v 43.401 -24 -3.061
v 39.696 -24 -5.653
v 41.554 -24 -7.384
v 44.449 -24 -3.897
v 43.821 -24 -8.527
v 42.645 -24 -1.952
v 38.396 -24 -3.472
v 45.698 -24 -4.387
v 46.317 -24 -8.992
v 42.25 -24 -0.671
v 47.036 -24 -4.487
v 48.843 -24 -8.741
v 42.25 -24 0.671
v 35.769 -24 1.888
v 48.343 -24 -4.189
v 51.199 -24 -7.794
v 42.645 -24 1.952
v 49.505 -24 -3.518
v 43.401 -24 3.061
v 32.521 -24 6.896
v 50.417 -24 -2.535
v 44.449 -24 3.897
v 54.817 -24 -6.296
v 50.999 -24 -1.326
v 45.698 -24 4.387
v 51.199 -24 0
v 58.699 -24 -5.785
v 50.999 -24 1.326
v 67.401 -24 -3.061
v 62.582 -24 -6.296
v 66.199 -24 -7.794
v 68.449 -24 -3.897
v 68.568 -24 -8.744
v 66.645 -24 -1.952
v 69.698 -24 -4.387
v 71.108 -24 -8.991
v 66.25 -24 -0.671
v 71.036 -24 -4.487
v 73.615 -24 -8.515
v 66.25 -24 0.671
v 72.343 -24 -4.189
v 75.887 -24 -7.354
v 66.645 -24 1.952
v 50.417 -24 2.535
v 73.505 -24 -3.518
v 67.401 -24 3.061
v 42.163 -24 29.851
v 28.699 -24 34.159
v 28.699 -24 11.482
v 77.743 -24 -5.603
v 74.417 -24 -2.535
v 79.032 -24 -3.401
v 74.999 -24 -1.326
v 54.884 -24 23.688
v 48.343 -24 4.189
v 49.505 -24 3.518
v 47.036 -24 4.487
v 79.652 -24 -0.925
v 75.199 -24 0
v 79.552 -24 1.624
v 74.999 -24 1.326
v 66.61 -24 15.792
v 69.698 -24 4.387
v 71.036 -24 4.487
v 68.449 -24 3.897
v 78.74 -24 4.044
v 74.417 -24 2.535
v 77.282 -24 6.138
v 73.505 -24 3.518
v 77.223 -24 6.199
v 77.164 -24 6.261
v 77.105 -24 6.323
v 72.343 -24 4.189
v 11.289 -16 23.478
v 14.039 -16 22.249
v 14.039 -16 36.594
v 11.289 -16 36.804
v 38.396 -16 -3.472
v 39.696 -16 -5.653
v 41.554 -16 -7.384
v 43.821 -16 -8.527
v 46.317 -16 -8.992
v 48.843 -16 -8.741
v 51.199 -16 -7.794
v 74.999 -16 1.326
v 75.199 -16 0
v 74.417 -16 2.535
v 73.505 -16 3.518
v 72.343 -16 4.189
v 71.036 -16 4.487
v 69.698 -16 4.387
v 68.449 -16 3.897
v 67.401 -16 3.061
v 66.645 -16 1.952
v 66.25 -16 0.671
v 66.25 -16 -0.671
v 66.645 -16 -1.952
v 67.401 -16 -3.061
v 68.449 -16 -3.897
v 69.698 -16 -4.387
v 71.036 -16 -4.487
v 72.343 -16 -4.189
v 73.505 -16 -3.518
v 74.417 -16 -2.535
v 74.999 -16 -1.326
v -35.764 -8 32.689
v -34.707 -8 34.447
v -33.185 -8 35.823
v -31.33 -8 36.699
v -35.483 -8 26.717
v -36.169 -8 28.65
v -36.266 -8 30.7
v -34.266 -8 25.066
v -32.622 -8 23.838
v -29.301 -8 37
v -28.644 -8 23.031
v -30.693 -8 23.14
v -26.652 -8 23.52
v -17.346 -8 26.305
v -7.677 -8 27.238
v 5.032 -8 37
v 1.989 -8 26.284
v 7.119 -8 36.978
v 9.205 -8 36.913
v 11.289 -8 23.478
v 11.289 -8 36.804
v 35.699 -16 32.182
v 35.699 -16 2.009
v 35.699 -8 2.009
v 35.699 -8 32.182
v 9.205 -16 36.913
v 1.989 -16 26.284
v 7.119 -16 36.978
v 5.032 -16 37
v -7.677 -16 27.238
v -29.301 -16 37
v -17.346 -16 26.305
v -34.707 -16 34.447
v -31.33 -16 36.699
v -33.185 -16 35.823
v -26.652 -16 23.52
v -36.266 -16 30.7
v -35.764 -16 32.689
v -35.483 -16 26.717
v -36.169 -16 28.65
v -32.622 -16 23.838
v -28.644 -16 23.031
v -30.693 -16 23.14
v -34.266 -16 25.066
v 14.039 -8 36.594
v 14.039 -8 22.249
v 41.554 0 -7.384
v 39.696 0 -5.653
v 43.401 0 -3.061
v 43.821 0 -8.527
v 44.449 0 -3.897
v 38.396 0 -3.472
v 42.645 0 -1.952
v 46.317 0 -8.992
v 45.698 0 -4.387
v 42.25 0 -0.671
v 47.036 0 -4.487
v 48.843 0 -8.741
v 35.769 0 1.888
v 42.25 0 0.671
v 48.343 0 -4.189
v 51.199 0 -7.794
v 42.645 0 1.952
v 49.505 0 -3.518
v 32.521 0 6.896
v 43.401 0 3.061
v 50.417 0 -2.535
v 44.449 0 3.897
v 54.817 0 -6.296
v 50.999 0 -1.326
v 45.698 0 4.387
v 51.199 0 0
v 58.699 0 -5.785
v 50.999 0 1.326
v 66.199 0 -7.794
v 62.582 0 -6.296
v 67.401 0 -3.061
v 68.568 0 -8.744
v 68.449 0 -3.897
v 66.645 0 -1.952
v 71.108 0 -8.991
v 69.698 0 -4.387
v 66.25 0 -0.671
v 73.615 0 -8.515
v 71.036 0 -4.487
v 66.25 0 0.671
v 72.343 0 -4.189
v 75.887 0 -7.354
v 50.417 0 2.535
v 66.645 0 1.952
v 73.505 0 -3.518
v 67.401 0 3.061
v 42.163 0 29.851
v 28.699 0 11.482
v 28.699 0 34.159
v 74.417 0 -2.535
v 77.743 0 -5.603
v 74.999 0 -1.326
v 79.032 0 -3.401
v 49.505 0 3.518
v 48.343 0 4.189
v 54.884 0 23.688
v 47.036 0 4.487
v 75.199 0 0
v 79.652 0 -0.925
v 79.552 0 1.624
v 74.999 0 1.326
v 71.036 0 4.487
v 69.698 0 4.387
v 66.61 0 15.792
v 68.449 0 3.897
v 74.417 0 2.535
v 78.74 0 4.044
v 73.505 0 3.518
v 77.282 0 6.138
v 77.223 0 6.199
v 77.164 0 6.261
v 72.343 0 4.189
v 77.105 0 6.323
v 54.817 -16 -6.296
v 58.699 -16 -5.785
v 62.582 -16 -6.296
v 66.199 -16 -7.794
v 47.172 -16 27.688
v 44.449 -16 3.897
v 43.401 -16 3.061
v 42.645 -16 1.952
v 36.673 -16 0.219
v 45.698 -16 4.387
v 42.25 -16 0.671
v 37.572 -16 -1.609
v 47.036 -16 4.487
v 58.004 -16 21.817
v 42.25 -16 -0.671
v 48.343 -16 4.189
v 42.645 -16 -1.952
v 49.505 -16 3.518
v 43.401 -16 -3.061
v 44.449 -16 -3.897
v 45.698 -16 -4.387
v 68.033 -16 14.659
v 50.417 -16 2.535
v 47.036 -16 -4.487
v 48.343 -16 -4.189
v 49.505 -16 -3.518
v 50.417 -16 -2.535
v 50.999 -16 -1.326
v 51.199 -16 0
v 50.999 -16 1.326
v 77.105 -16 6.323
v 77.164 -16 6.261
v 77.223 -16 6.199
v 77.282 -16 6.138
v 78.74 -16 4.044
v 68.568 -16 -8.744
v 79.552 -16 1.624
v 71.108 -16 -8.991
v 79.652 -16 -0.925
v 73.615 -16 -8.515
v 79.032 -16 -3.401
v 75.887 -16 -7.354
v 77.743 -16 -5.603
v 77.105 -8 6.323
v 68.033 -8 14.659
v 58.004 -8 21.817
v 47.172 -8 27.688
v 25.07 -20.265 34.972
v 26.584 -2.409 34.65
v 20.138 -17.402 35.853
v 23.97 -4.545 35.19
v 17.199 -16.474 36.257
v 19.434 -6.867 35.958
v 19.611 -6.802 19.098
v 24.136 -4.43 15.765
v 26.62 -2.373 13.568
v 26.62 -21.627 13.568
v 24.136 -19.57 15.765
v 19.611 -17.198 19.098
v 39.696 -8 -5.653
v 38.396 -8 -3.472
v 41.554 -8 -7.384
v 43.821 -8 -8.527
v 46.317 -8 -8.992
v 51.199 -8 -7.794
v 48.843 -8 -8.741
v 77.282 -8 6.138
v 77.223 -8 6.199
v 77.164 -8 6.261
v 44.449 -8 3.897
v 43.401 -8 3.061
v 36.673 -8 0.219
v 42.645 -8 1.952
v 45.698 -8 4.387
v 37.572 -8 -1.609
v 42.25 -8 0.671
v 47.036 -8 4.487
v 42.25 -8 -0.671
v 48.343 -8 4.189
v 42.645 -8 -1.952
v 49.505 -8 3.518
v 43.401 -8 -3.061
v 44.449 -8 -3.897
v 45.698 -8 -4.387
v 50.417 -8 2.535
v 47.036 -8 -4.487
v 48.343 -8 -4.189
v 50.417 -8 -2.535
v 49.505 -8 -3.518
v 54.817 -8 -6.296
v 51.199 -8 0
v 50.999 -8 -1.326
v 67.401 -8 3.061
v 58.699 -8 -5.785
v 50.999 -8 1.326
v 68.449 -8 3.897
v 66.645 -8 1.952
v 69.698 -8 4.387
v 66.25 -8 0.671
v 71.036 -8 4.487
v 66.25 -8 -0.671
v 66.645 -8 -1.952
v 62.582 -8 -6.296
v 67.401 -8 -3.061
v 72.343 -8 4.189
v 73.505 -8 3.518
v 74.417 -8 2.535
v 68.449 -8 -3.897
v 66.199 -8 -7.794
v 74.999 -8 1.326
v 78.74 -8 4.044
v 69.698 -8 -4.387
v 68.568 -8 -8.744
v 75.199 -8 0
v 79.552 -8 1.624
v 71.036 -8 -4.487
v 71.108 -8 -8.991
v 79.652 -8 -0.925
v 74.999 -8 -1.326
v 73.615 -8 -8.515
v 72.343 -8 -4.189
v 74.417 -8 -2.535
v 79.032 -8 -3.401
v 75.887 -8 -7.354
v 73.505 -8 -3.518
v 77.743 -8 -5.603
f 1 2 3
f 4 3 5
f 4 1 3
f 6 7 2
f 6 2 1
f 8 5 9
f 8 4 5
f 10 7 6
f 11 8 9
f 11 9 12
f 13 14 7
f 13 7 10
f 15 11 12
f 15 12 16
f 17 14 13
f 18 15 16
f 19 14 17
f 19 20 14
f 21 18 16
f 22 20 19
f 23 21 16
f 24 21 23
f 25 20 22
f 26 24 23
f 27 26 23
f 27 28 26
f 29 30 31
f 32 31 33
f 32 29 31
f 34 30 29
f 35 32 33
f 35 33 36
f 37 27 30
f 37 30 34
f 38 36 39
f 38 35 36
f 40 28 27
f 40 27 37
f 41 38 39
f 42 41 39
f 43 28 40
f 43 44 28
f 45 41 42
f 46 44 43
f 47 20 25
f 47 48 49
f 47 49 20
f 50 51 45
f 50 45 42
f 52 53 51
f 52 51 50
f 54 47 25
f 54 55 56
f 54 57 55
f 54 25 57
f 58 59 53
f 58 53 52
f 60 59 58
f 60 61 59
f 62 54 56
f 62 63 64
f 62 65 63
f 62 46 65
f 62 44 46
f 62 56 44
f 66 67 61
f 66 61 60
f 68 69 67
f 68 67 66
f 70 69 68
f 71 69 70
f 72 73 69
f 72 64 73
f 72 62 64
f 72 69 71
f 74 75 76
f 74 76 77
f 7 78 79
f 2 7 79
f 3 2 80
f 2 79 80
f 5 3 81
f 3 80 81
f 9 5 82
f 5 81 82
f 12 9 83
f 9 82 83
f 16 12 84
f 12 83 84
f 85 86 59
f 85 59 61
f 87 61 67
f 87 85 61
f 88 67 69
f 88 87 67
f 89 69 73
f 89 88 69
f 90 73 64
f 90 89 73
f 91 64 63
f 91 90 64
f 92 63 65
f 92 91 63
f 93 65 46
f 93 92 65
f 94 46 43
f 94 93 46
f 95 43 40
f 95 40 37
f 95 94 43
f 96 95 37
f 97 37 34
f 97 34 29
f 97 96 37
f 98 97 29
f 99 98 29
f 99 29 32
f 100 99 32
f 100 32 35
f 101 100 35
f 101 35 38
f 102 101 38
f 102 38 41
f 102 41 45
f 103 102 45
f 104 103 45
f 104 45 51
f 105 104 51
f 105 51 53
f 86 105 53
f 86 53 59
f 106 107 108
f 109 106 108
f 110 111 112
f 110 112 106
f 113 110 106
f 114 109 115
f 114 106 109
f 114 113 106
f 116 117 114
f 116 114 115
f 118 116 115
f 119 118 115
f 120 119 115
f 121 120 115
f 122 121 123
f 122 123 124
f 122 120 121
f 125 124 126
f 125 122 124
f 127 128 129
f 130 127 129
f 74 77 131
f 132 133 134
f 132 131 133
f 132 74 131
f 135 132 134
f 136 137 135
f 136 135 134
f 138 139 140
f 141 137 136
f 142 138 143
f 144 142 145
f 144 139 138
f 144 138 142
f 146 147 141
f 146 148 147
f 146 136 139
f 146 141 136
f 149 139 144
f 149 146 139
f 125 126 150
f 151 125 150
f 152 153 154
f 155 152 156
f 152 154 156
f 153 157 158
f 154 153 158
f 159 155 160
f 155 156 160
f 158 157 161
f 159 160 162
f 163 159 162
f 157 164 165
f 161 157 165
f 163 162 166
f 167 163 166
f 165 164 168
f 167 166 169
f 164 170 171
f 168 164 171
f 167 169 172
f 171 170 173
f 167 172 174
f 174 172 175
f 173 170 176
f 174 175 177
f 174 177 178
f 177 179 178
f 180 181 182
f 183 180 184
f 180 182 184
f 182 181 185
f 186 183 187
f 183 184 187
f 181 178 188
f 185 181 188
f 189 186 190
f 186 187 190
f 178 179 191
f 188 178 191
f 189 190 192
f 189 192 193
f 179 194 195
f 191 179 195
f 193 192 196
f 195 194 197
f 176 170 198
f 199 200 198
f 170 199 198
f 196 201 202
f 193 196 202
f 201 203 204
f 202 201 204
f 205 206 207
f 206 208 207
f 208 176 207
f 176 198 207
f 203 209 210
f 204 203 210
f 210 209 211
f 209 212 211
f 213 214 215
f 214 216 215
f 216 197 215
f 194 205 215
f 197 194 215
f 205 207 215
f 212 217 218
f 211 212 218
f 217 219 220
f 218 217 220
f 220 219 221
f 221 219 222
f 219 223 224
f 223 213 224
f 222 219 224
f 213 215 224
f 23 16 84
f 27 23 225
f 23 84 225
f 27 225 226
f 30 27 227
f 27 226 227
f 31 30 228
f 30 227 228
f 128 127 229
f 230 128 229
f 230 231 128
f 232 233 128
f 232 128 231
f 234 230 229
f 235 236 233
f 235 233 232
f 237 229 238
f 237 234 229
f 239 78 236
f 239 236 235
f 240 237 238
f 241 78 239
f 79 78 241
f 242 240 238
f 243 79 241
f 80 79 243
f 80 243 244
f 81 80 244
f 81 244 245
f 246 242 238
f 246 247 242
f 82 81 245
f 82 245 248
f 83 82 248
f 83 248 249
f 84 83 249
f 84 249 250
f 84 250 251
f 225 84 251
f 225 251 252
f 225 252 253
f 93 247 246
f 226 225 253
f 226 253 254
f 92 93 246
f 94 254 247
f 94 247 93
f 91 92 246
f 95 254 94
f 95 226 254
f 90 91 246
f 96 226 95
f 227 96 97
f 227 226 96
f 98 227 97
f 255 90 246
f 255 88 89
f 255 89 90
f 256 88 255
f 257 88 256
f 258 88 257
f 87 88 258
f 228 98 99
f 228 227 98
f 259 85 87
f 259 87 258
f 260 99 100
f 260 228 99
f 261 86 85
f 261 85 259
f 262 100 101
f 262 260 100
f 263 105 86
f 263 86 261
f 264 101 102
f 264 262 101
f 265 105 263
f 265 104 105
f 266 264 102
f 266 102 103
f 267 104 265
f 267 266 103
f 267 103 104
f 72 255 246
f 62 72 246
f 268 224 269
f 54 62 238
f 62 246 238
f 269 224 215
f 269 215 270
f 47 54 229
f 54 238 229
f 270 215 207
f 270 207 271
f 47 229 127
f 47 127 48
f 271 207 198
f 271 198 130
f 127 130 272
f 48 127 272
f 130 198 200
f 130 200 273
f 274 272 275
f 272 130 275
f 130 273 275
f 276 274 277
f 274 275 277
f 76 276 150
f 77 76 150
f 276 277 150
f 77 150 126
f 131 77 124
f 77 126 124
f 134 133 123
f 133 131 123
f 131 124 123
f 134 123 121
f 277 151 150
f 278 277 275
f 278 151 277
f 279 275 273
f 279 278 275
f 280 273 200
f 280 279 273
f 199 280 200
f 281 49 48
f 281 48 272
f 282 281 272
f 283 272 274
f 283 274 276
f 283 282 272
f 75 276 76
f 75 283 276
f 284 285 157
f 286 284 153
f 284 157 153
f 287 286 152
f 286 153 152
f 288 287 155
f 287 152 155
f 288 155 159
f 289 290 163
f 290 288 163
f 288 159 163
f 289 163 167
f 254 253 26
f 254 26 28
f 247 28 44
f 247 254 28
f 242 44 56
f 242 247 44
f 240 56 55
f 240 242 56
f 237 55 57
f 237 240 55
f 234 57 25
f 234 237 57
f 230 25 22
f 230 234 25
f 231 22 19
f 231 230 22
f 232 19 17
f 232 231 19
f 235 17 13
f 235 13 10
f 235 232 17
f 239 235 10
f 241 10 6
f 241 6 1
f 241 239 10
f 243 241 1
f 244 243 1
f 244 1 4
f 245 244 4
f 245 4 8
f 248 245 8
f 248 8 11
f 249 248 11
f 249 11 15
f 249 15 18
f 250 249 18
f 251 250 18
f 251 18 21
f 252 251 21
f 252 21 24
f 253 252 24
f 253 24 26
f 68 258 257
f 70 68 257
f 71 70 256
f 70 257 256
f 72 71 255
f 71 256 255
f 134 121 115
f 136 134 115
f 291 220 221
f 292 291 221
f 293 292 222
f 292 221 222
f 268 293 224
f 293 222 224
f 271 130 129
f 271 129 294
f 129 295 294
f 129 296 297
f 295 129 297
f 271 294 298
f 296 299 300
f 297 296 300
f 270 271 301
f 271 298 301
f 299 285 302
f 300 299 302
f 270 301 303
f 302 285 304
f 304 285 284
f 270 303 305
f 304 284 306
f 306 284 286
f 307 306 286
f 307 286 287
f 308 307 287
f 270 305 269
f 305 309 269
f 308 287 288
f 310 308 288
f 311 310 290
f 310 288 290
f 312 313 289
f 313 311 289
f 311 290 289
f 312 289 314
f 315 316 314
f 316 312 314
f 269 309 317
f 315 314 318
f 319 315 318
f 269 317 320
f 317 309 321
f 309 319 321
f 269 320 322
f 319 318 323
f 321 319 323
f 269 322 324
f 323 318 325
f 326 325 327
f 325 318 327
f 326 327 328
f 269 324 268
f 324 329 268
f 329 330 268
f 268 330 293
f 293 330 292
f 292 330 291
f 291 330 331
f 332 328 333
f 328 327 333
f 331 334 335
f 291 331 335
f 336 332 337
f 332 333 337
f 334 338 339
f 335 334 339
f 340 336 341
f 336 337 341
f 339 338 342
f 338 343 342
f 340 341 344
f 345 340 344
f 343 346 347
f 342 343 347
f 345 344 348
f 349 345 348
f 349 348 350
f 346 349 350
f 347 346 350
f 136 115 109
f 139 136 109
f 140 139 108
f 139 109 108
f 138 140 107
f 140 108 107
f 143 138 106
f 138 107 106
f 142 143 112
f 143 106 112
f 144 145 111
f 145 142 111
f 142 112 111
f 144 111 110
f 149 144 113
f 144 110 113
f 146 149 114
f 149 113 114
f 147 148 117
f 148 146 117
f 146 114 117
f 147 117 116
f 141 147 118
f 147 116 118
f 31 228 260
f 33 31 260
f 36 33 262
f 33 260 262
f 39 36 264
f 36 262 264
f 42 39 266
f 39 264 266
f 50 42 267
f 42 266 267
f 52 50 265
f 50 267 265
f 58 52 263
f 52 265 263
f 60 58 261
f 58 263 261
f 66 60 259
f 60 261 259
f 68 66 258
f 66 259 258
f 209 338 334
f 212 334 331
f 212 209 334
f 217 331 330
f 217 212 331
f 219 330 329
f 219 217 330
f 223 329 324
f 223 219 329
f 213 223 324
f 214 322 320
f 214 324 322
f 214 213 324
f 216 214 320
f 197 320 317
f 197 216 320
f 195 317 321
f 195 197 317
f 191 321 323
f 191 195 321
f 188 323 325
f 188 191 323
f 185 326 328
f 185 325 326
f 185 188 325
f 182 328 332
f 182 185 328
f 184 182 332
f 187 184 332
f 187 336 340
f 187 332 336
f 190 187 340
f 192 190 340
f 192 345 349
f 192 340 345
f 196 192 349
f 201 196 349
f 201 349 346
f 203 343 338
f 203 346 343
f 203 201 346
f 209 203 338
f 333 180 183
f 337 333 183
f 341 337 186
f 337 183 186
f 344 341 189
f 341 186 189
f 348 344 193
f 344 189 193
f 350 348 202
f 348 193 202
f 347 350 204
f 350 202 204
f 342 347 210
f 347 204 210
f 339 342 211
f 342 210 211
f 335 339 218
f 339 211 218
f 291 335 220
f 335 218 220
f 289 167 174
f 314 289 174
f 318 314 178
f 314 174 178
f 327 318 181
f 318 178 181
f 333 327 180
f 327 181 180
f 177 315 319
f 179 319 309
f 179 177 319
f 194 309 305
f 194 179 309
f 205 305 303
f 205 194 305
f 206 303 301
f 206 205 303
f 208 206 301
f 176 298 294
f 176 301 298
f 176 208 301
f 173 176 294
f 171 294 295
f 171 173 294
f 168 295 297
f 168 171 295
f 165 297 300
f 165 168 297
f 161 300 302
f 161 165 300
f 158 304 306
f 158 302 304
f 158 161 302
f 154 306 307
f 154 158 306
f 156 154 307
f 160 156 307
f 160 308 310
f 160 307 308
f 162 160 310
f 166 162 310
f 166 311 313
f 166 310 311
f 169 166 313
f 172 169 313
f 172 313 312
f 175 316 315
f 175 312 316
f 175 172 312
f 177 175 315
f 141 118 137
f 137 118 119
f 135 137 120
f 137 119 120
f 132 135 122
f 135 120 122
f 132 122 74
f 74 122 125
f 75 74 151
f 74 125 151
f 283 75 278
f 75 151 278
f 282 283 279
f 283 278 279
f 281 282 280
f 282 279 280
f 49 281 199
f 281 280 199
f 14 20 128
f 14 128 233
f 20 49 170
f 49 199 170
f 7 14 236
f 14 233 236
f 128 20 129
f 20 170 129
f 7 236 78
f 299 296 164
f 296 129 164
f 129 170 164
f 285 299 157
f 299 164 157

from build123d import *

# Parameters (mm, degrees)
F0_R          = 4.5
F1_DEPTH      = 24
F2_W          = 44
F2_H          = 8
F3_DEPTH      = 500
F3_DEPTH_BACK = 500


with BuildPart() as f1:
    # F0 (on Front) → F1 (new body)
    with BuildSketch(Plane.XZ):
        with BuildLine():
            Line((5.0324307792, 37), (-29.3005991912, 37))
            ThreePointArc((-29.3005991912, 37), (-36.16925593, 28.6503501919), (-26.6519474056, 23.5204441728))
            ThreePointArc((-26.6519474056, 23.5204441728), (11.4307481655, 23.4196145494), (38.3961523004, -3.4721843568))
            ThreePointArc((38.3961523004, -3.4721843568), (43.8208262505, -8.5272392081), (51.1994008088, -7.7942286341))
            ThreePointArc((51.1994008088, -7.7942286341), (58.6994008088, -5.7846096908), (66.1994008088, -7.7942286341))
            ThreePointArc((66.1994008088, -7.7942286341), (77.7427343256, -5.6028075971), (77.281890635, 6.1376565306))
            ThreePointArc((77.281890635, 6.1376565306), (77.1932786056, 6.2301382417), (77.1045481967, 6.3225063811))
            ThreePointArc((77.1045481967, 6.3225063811), (44.1971429695, 29.011549922), (5.0324307792, 37))
        make_face()
        with Locations((46.6994008088, 0)):
            Circle(F0_R, mode=Mode.SUBTRACT)
        with Locations((70.6994008088, 0)):
            Circle(F0_R, mode=Mode.SUBTRACT)
    extrude(amount=F1_DEPTH)

    # F2 (on Top) → F3 (cut, two sides)
    with BuildSketch(Plane.XY) as f3_sk:
        with BuildLine():
            Line((-36.3005991912, 0), (-36.3005991912, -8))
            Line((-36.3005991912, -8), (11.2890750086, -8))
            Line((11.2890750086, -8), (14.0389679, -8))
            ThreePointArc((14.0389679, -8), (22.2442020954, -5.6035173609), (28.6994008088, 0))
            Line((28.6994008088, 0), (-36.3005991912, 0))
        make_face()
        with BuildLine():
            Line((-36.3005991912, -16), (-36.3005991912, -24))
            Line((-36.3005991912, -24), (28.6994008088, -24))
            ThreePointArc((28.6994008088, -24), (22.2442020954, -18.3964826391), (14.0389679, -16))
            Line((14.0389679, -16), (11.2890750086, -16))
            Line((11.2890750086, -16), (-36.3005991912, -16))
        make_face()
        with BuildLine():
            ThreePointArc((14.0389679, -16), (12.6640214543, -15.9526820822), (11.2890750086, -16))
            Line((11.2890750086, -16), (14.0389679, -16))
        make_face()
        with BuildLine():
            Line((14.0389679, -8), (11.2890750086, -8))
            ThreePointArc((11.2890750086, -8), (12.6640214543, -8.0473179178), (14.0389679, -8))
        make_face()
        with Locations((57.6994008088, -12)):
            Rectangle(F2_W, F2_H)
    extrude(amount=-F3_DEPTH, mode=Mode.SUBTRACT)
    extrude(f3_sk.sketch, amount=F3_DEPTH_BACK, mode=Mode.SUBTRACT)


solid = f1.part
